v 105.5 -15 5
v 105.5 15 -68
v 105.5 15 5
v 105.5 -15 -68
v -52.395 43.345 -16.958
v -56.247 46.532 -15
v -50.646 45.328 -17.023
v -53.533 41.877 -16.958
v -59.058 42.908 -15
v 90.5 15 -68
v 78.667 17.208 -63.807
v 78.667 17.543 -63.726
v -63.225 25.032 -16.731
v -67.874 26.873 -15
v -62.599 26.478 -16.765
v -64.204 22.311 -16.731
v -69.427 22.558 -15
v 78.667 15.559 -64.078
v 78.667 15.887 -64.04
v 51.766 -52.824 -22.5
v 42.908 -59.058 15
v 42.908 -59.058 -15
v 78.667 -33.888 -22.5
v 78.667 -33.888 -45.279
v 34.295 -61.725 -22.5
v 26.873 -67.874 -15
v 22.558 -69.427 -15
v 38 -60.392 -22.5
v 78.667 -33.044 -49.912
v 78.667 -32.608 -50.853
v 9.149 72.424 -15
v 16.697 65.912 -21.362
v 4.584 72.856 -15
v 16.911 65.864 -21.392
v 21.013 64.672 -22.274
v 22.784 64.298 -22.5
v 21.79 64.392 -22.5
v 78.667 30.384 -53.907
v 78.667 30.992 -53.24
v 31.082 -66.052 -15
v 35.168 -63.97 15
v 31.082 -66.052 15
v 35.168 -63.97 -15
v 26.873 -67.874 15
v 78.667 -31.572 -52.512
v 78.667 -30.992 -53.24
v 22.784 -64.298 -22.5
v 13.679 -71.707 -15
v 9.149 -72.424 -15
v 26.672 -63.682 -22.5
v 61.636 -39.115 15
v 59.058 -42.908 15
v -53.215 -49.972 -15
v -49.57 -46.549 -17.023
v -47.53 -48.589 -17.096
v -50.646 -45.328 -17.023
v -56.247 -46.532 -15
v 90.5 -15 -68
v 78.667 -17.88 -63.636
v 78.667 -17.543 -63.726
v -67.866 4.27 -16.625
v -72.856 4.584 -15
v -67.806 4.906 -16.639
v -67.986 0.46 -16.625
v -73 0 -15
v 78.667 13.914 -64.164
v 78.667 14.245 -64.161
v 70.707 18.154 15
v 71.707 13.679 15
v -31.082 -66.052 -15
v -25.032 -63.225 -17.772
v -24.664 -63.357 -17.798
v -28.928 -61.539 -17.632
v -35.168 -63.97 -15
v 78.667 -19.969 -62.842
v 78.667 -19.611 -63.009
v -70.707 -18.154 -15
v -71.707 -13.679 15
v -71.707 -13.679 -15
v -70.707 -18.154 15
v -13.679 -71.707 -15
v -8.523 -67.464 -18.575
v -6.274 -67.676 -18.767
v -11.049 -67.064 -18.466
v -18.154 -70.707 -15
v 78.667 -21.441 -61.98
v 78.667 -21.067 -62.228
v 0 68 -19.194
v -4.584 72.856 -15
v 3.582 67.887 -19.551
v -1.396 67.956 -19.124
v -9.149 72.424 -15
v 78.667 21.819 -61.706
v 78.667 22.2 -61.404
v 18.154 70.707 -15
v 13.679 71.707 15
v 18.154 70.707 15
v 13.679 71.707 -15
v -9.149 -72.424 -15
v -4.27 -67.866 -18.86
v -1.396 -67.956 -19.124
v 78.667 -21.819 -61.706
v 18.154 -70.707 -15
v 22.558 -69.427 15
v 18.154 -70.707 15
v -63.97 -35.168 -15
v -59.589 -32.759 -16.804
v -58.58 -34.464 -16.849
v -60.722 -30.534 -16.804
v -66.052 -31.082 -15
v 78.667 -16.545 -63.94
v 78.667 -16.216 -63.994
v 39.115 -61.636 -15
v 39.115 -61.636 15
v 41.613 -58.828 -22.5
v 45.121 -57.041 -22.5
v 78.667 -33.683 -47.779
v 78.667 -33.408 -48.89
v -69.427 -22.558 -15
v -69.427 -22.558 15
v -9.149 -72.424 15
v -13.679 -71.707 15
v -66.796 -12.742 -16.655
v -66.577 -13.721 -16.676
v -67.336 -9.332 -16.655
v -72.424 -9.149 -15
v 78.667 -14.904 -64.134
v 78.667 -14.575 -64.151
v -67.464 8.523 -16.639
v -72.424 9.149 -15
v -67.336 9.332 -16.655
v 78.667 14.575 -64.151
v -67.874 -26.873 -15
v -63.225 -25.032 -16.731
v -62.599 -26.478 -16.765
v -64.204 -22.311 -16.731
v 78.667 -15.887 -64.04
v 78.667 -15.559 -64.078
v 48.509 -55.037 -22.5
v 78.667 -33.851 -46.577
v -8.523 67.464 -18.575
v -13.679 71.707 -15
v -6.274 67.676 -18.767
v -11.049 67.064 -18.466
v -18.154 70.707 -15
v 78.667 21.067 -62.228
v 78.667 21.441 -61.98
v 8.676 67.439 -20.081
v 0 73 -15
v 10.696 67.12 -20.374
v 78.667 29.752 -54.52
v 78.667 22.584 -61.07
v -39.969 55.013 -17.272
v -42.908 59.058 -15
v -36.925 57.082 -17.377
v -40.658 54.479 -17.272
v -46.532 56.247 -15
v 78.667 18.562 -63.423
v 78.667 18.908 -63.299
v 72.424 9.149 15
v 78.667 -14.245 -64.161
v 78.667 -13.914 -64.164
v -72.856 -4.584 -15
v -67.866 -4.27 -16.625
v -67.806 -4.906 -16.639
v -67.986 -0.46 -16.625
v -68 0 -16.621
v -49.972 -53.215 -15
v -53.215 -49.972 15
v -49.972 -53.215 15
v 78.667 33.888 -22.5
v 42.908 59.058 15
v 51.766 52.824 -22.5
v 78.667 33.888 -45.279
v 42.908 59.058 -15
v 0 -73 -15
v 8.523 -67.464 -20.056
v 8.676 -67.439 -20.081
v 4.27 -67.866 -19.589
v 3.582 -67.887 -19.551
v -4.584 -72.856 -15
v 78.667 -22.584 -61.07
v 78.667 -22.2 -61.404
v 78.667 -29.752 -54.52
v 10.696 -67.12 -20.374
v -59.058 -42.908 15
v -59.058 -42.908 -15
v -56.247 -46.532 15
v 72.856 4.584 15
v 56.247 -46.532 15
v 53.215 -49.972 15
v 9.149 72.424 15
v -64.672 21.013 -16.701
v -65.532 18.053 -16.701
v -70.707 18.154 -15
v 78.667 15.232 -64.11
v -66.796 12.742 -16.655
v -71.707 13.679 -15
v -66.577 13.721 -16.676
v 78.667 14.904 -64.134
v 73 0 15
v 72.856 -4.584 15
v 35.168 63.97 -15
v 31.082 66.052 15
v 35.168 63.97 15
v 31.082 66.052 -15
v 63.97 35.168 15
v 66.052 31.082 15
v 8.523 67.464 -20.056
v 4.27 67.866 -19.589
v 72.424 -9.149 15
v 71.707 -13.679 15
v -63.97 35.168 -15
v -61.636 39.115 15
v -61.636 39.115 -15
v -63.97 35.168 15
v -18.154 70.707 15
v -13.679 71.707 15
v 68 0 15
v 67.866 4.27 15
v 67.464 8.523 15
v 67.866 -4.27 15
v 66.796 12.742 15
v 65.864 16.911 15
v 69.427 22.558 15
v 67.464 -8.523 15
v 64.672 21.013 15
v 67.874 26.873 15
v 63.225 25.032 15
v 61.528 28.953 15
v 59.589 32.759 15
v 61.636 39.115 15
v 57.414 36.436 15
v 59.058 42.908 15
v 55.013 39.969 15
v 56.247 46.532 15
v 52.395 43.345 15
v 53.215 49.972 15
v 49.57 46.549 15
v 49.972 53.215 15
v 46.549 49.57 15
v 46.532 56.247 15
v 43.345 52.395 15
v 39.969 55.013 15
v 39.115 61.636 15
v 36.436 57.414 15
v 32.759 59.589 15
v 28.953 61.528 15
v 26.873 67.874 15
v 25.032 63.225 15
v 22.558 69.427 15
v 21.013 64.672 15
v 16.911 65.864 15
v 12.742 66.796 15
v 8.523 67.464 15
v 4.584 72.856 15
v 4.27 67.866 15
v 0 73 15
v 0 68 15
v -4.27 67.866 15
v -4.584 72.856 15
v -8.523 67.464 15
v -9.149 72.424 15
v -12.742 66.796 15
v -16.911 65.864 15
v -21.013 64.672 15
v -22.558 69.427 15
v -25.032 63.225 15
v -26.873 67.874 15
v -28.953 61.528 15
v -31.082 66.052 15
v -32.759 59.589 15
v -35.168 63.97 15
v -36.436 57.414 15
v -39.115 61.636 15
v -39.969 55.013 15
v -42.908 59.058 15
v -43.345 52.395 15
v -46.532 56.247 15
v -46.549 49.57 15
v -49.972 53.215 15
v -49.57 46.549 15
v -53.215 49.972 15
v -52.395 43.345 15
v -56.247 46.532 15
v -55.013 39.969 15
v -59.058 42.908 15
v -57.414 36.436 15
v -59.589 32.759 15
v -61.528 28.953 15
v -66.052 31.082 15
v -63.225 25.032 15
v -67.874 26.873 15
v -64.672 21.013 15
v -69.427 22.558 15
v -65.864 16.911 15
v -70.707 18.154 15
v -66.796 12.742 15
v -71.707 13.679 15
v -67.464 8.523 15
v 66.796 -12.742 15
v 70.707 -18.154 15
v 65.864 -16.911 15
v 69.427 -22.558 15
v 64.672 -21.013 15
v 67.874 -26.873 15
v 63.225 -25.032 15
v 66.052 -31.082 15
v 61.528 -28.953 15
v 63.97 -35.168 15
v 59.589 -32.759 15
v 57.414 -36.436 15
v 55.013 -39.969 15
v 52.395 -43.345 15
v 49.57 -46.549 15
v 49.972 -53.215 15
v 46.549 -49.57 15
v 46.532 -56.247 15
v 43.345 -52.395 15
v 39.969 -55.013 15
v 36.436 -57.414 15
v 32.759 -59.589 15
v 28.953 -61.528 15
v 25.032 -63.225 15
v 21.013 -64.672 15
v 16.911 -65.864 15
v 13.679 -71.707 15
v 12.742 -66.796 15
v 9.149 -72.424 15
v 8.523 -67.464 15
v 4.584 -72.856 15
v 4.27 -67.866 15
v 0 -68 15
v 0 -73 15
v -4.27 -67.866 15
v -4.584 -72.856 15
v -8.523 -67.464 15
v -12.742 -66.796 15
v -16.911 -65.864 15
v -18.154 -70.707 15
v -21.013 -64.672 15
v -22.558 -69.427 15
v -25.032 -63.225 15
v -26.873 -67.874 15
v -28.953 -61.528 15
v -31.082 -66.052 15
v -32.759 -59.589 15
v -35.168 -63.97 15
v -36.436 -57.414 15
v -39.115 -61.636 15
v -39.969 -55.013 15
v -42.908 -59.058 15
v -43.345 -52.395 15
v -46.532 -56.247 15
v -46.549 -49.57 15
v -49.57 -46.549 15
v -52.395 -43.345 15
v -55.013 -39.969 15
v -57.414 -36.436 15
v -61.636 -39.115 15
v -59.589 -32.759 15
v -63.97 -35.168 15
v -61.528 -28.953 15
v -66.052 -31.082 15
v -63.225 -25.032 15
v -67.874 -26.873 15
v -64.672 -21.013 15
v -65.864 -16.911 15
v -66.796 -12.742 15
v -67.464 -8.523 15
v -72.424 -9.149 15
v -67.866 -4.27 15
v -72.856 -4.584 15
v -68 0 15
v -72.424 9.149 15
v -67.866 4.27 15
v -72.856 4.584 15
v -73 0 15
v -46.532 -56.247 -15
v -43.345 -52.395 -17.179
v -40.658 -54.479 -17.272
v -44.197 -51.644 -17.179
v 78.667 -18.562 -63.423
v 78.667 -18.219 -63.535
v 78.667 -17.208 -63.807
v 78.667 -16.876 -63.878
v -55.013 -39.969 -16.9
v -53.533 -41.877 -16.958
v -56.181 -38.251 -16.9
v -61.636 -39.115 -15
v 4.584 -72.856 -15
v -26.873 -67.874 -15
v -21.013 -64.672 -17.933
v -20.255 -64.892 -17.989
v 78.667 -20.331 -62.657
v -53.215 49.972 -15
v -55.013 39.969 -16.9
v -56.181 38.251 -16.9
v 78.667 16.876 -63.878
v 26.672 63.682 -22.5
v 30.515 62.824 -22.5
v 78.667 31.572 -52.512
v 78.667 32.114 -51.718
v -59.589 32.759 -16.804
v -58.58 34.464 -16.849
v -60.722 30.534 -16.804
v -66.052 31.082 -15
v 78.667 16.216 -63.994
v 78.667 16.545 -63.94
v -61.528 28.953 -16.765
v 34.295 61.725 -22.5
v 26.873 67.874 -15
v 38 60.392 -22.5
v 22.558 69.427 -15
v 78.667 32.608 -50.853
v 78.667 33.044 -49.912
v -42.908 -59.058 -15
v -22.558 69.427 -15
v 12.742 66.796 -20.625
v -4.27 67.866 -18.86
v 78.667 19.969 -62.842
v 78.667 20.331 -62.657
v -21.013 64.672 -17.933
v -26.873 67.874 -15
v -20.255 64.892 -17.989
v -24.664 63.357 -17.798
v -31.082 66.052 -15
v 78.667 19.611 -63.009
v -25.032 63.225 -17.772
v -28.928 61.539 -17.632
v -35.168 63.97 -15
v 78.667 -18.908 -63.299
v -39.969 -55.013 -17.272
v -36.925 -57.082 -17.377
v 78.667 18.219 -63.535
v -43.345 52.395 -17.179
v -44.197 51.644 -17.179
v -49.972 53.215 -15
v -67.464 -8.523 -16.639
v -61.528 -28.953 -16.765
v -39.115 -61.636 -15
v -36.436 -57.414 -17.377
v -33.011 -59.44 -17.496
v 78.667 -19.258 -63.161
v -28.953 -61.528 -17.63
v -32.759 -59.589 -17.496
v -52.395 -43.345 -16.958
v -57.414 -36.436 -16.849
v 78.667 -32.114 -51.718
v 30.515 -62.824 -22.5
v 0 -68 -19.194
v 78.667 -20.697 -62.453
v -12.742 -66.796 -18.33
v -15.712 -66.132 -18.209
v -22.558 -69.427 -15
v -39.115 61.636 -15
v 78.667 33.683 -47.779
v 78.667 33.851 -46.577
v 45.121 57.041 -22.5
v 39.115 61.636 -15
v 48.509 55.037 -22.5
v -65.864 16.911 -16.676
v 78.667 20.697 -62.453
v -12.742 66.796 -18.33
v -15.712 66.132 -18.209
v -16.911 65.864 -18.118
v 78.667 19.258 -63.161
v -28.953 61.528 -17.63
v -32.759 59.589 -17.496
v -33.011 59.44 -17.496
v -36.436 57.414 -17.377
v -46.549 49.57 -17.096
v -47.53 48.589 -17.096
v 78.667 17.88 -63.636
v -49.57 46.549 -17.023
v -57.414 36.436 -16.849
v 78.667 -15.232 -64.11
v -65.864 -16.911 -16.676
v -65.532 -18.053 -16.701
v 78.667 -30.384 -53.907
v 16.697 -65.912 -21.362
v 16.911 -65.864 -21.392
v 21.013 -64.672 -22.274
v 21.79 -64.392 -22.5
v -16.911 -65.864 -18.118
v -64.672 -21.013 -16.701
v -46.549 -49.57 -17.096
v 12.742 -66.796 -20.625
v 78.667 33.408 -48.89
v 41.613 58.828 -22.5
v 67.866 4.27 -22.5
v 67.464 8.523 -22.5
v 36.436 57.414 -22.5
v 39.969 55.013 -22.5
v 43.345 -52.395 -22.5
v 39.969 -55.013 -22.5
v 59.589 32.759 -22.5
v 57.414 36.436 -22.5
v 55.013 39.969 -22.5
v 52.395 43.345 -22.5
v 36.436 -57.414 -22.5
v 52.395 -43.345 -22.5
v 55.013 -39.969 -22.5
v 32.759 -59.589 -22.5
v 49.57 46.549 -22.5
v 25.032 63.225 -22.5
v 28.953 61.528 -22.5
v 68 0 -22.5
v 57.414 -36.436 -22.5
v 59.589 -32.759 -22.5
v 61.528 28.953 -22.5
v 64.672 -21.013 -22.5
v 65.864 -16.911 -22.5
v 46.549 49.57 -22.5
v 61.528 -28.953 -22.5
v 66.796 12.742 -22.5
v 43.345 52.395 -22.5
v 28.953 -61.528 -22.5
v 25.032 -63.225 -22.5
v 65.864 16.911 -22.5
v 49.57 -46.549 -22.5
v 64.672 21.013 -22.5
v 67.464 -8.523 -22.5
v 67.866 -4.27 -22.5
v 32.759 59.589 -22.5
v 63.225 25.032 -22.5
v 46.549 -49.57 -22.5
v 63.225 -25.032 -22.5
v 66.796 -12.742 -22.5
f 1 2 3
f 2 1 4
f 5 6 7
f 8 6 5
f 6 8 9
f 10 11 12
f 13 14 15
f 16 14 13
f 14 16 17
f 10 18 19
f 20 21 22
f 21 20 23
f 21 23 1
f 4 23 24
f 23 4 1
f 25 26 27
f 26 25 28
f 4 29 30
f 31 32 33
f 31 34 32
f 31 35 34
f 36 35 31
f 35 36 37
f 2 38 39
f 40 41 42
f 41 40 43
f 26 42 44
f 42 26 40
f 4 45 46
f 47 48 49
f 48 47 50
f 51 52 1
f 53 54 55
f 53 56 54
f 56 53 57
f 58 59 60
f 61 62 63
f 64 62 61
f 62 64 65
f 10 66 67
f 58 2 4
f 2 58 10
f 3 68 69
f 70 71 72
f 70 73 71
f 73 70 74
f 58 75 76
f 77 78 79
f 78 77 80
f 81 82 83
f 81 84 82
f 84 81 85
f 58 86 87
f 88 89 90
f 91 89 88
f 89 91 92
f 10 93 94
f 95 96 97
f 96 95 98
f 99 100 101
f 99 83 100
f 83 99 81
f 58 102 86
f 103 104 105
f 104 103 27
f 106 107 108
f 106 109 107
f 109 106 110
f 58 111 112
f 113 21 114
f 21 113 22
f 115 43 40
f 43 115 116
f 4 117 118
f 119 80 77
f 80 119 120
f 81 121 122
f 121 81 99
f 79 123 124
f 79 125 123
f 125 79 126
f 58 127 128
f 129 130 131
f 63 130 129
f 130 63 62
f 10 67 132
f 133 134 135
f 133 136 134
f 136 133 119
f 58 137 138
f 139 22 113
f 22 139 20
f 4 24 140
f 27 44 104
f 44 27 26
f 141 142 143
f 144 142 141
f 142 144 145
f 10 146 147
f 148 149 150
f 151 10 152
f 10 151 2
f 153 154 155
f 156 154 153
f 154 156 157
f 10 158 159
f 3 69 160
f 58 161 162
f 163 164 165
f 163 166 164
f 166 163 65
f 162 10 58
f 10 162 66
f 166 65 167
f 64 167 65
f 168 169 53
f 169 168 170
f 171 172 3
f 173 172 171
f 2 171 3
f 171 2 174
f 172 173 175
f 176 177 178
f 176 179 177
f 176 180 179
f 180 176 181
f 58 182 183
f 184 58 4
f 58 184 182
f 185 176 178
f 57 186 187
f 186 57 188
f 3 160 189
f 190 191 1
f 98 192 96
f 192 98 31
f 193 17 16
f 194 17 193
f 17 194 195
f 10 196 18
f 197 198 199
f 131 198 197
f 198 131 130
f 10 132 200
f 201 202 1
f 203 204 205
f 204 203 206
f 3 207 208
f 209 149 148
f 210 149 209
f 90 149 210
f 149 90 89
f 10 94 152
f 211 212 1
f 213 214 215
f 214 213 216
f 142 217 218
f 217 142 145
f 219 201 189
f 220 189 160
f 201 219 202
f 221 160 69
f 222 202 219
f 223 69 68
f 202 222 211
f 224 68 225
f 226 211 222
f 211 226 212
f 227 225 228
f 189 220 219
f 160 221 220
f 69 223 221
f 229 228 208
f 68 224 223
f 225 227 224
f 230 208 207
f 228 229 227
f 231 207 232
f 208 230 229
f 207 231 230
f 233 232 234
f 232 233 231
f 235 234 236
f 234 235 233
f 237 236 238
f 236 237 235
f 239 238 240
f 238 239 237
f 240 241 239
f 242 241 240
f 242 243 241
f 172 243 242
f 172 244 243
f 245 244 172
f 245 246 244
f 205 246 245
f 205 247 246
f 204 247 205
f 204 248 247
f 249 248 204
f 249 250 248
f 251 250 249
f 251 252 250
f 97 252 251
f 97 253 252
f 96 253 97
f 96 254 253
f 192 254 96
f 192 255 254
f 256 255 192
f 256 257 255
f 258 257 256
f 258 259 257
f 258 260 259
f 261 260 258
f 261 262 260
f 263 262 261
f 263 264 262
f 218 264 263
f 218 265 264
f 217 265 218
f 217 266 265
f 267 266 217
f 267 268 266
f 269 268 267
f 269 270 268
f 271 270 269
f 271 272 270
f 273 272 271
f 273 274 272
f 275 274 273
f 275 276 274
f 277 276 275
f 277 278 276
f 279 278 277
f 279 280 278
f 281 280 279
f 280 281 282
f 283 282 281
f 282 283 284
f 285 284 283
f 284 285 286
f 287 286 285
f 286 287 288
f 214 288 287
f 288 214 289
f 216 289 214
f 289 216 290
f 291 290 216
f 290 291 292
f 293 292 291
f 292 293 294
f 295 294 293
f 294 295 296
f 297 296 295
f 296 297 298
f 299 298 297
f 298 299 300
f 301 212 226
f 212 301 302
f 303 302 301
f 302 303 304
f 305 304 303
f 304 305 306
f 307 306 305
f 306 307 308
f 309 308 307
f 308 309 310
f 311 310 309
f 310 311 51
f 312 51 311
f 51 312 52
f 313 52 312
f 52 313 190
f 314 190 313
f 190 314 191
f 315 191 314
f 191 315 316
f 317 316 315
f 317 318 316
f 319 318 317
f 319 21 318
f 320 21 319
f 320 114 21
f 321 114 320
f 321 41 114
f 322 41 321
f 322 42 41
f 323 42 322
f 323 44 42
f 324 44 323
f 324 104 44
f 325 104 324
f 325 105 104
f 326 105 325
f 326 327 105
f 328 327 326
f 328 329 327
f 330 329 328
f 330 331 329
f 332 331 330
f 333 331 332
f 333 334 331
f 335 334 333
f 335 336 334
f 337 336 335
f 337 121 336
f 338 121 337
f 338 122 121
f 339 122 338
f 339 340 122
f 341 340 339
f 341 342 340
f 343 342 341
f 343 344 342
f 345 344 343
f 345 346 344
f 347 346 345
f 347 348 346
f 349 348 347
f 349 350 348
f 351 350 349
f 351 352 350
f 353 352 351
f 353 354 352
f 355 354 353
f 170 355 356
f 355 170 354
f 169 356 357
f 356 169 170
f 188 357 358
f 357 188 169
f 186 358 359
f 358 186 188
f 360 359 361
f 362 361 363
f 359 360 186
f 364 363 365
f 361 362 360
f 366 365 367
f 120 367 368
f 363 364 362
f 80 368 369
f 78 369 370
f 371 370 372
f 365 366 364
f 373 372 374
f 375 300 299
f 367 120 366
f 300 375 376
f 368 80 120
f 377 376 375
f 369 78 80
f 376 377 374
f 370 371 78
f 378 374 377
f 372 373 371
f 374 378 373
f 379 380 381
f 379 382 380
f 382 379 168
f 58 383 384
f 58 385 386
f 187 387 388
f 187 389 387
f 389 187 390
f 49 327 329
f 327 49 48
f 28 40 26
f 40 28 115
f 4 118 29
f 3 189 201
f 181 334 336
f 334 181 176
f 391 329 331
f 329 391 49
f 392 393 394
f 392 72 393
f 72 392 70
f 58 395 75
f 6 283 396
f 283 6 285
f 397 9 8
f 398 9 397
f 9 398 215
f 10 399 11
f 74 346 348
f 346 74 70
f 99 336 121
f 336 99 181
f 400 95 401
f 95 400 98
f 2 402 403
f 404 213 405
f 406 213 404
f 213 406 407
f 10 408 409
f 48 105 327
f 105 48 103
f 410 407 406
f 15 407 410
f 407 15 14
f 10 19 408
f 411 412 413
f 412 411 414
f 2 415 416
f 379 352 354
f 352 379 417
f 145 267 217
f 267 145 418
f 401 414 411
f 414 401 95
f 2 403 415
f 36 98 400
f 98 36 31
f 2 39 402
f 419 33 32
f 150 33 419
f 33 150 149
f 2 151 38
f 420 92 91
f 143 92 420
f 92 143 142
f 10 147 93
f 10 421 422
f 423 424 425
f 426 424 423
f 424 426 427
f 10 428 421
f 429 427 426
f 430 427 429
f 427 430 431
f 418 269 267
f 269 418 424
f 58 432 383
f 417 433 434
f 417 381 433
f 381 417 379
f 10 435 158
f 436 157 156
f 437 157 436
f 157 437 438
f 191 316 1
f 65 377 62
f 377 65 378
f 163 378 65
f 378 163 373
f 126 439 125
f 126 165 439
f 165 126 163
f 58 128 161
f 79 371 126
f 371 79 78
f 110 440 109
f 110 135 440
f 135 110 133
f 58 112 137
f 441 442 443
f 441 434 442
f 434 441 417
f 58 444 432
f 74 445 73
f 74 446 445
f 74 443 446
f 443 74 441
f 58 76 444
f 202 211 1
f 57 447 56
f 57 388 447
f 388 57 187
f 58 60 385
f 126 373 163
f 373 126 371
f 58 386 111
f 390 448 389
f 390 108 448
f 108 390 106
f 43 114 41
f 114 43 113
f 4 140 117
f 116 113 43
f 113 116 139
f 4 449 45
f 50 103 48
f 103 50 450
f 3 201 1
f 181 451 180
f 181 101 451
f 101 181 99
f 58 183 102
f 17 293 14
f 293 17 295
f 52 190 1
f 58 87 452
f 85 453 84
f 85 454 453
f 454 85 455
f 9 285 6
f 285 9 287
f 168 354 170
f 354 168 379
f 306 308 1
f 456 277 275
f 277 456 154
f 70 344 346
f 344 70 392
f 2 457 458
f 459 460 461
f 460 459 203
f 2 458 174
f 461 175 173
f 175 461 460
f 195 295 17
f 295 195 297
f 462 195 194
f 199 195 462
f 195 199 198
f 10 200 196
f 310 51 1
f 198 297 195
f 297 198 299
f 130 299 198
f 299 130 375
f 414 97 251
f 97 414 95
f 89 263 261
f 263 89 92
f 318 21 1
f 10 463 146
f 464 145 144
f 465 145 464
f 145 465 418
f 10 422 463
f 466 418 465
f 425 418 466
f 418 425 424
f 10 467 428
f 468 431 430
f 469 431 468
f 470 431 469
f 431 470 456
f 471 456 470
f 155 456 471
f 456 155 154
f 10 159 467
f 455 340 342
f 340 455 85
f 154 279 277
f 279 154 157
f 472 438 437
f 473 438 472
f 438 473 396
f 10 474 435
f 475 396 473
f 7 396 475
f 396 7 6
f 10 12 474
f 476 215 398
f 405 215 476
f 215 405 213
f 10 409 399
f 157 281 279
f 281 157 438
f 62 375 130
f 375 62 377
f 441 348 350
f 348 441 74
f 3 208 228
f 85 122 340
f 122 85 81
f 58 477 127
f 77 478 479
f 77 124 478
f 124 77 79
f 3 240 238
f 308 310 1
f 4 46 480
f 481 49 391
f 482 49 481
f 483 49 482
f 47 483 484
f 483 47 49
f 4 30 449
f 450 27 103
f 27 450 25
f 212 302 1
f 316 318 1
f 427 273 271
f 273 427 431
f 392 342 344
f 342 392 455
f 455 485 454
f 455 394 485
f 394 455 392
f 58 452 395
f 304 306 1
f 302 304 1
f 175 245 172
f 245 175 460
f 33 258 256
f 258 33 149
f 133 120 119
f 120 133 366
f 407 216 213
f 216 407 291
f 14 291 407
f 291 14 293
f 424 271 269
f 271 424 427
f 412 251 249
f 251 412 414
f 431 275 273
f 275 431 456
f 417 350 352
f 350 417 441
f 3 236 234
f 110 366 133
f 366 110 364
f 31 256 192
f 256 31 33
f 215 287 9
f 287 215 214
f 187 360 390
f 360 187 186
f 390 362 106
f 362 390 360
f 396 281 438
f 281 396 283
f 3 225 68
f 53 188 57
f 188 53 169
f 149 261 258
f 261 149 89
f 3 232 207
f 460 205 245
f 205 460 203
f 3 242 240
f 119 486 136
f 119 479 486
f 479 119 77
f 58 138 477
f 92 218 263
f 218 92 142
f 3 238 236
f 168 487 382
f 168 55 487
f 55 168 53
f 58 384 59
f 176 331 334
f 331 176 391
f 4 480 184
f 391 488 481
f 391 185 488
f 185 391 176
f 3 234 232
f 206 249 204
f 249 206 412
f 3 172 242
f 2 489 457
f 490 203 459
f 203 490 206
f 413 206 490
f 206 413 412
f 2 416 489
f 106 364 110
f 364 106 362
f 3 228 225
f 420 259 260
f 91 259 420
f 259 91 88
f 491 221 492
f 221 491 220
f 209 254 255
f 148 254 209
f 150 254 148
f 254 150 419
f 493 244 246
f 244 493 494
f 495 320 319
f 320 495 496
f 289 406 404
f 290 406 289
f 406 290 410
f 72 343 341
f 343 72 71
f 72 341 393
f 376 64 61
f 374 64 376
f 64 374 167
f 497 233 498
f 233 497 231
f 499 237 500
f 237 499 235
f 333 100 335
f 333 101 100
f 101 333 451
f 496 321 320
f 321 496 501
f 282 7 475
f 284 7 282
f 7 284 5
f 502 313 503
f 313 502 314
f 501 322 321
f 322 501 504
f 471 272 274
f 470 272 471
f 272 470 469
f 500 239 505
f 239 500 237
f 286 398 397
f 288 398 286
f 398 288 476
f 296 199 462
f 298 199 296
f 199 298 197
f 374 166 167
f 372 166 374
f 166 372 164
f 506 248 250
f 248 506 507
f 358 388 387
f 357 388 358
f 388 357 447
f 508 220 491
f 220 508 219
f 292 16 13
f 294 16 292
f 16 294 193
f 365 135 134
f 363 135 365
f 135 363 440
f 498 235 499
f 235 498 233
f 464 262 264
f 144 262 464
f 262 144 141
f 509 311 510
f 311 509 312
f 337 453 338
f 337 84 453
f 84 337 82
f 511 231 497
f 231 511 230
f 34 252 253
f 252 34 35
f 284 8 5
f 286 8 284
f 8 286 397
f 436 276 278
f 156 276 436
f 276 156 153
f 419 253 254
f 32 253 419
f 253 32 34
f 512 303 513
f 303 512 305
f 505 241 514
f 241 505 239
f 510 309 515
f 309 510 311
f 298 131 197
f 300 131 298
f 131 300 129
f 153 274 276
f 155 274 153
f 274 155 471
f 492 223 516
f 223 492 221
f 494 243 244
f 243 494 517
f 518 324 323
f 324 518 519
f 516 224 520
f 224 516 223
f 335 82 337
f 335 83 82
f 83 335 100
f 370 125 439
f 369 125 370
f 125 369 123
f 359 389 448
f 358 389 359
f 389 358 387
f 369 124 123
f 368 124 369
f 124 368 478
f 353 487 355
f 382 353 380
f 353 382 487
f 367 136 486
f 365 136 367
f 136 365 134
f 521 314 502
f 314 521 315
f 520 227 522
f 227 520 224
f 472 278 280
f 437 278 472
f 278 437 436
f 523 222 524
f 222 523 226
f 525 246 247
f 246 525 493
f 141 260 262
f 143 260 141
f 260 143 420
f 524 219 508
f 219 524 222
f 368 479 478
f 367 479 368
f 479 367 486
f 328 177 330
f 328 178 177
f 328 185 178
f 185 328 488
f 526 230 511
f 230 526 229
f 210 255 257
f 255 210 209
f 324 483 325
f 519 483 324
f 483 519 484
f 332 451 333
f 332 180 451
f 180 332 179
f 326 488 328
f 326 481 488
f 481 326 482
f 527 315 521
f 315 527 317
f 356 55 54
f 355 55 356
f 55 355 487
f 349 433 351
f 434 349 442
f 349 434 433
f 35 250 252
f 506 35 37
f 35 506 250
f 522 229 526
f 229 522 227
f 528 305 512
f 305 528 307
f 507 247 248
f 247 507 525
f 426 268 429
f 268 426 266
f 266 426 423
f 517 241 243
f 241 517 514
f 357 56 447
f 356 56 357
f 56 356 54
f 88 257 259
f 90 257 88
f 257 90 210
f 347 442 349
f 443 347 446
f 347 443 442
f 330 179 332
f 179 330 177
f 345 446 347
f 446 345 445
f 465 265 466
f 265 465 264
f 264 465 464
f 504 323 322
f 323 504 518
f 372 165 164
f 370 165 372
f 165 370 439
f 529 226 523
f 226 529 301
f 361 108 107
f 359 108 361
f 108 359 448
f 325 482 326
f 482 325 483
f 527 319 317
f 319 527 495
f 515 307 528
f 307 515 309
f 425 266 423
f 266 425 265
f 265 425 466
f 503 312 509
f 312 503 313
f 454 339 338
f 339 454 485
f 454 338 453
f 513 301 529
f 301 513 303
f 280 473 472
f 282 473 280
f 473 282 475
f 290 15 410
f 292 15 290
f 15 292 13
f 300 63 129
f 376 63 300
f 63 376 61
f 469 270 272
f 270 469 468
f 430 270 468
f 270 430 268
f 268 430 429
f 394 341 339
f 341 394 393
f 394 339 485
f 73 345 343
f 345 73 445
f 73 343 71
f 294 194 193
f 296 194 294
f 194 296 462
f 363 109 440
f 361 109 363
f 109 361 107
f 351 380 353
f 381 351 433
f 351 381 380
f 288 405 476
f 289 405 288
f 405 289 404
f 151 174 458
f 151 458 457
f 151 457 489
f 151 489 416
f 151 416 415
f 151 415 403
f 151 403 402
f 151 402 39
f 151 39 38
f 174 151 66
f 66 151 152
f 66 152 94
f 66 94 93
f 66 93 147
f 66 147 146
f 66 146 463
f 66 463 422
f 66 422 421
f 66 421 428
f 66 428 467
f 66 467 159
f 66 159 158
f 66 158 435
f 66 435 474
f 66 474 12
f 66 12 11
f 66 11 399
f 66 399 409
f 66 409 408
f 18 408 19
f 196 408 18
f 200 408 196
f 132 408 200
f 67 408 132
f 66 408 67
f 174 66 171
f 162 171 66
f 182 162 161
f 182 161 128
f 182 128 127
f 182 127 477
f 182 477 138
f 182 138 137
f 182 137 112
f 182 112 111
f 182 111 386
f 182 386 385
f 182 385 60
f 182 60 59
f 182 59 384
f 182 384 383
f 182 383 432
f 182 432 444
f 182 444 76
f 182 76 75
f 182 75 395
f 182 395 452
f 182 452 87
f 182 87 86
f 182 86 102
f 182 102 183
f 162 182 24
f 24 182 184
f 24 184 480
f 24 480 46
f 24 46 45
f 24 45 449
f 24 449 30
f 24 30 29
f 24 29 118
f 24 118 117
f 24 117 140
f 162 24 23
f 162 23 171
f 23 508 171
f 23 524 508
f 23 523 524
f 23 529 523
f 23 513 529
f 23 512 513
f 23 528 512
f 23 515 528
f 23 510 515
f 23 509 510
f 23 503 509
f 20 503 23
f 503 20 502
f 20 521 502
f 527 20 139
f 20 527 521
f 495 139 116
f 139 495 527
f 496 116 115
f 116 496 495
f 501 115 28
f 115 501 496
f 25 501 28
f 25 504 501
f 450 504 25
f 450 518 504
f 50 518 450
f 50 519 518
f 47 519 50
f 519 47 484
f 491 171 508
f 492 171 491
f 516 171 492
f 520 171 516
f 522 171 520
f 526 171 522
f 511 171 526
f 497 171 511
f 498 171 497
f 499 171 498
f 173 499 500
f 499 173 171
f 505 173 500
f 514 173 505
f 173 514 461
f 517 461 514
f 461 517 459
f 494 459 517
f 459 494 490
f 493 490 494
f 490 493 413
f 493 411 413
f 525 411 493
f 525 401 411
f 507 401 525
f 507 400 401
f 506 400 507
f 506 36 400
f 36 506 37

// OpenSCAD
$fn=100;

h=30;
d1=73;
d2=d1-5;

module grip(){hull(){translate([d1,0,0])cube([h+5,h,(h-10)/2],center=true);cylinder(h,d1,d1,center=true);}}
module handle(){translate([h+d2,0,-(d2-5)/2])cube([h/2,h,d1],center=true);}
module combined(){hull(){grip();handle();}}
module holder(){difference(){combined();cylinder(100*h,d2,d2,center=true);}}
difference(){holder();translate([d1/1.5,0,-1.75*h])cube([2*h,2.5*d1,2*h],center=true);}
